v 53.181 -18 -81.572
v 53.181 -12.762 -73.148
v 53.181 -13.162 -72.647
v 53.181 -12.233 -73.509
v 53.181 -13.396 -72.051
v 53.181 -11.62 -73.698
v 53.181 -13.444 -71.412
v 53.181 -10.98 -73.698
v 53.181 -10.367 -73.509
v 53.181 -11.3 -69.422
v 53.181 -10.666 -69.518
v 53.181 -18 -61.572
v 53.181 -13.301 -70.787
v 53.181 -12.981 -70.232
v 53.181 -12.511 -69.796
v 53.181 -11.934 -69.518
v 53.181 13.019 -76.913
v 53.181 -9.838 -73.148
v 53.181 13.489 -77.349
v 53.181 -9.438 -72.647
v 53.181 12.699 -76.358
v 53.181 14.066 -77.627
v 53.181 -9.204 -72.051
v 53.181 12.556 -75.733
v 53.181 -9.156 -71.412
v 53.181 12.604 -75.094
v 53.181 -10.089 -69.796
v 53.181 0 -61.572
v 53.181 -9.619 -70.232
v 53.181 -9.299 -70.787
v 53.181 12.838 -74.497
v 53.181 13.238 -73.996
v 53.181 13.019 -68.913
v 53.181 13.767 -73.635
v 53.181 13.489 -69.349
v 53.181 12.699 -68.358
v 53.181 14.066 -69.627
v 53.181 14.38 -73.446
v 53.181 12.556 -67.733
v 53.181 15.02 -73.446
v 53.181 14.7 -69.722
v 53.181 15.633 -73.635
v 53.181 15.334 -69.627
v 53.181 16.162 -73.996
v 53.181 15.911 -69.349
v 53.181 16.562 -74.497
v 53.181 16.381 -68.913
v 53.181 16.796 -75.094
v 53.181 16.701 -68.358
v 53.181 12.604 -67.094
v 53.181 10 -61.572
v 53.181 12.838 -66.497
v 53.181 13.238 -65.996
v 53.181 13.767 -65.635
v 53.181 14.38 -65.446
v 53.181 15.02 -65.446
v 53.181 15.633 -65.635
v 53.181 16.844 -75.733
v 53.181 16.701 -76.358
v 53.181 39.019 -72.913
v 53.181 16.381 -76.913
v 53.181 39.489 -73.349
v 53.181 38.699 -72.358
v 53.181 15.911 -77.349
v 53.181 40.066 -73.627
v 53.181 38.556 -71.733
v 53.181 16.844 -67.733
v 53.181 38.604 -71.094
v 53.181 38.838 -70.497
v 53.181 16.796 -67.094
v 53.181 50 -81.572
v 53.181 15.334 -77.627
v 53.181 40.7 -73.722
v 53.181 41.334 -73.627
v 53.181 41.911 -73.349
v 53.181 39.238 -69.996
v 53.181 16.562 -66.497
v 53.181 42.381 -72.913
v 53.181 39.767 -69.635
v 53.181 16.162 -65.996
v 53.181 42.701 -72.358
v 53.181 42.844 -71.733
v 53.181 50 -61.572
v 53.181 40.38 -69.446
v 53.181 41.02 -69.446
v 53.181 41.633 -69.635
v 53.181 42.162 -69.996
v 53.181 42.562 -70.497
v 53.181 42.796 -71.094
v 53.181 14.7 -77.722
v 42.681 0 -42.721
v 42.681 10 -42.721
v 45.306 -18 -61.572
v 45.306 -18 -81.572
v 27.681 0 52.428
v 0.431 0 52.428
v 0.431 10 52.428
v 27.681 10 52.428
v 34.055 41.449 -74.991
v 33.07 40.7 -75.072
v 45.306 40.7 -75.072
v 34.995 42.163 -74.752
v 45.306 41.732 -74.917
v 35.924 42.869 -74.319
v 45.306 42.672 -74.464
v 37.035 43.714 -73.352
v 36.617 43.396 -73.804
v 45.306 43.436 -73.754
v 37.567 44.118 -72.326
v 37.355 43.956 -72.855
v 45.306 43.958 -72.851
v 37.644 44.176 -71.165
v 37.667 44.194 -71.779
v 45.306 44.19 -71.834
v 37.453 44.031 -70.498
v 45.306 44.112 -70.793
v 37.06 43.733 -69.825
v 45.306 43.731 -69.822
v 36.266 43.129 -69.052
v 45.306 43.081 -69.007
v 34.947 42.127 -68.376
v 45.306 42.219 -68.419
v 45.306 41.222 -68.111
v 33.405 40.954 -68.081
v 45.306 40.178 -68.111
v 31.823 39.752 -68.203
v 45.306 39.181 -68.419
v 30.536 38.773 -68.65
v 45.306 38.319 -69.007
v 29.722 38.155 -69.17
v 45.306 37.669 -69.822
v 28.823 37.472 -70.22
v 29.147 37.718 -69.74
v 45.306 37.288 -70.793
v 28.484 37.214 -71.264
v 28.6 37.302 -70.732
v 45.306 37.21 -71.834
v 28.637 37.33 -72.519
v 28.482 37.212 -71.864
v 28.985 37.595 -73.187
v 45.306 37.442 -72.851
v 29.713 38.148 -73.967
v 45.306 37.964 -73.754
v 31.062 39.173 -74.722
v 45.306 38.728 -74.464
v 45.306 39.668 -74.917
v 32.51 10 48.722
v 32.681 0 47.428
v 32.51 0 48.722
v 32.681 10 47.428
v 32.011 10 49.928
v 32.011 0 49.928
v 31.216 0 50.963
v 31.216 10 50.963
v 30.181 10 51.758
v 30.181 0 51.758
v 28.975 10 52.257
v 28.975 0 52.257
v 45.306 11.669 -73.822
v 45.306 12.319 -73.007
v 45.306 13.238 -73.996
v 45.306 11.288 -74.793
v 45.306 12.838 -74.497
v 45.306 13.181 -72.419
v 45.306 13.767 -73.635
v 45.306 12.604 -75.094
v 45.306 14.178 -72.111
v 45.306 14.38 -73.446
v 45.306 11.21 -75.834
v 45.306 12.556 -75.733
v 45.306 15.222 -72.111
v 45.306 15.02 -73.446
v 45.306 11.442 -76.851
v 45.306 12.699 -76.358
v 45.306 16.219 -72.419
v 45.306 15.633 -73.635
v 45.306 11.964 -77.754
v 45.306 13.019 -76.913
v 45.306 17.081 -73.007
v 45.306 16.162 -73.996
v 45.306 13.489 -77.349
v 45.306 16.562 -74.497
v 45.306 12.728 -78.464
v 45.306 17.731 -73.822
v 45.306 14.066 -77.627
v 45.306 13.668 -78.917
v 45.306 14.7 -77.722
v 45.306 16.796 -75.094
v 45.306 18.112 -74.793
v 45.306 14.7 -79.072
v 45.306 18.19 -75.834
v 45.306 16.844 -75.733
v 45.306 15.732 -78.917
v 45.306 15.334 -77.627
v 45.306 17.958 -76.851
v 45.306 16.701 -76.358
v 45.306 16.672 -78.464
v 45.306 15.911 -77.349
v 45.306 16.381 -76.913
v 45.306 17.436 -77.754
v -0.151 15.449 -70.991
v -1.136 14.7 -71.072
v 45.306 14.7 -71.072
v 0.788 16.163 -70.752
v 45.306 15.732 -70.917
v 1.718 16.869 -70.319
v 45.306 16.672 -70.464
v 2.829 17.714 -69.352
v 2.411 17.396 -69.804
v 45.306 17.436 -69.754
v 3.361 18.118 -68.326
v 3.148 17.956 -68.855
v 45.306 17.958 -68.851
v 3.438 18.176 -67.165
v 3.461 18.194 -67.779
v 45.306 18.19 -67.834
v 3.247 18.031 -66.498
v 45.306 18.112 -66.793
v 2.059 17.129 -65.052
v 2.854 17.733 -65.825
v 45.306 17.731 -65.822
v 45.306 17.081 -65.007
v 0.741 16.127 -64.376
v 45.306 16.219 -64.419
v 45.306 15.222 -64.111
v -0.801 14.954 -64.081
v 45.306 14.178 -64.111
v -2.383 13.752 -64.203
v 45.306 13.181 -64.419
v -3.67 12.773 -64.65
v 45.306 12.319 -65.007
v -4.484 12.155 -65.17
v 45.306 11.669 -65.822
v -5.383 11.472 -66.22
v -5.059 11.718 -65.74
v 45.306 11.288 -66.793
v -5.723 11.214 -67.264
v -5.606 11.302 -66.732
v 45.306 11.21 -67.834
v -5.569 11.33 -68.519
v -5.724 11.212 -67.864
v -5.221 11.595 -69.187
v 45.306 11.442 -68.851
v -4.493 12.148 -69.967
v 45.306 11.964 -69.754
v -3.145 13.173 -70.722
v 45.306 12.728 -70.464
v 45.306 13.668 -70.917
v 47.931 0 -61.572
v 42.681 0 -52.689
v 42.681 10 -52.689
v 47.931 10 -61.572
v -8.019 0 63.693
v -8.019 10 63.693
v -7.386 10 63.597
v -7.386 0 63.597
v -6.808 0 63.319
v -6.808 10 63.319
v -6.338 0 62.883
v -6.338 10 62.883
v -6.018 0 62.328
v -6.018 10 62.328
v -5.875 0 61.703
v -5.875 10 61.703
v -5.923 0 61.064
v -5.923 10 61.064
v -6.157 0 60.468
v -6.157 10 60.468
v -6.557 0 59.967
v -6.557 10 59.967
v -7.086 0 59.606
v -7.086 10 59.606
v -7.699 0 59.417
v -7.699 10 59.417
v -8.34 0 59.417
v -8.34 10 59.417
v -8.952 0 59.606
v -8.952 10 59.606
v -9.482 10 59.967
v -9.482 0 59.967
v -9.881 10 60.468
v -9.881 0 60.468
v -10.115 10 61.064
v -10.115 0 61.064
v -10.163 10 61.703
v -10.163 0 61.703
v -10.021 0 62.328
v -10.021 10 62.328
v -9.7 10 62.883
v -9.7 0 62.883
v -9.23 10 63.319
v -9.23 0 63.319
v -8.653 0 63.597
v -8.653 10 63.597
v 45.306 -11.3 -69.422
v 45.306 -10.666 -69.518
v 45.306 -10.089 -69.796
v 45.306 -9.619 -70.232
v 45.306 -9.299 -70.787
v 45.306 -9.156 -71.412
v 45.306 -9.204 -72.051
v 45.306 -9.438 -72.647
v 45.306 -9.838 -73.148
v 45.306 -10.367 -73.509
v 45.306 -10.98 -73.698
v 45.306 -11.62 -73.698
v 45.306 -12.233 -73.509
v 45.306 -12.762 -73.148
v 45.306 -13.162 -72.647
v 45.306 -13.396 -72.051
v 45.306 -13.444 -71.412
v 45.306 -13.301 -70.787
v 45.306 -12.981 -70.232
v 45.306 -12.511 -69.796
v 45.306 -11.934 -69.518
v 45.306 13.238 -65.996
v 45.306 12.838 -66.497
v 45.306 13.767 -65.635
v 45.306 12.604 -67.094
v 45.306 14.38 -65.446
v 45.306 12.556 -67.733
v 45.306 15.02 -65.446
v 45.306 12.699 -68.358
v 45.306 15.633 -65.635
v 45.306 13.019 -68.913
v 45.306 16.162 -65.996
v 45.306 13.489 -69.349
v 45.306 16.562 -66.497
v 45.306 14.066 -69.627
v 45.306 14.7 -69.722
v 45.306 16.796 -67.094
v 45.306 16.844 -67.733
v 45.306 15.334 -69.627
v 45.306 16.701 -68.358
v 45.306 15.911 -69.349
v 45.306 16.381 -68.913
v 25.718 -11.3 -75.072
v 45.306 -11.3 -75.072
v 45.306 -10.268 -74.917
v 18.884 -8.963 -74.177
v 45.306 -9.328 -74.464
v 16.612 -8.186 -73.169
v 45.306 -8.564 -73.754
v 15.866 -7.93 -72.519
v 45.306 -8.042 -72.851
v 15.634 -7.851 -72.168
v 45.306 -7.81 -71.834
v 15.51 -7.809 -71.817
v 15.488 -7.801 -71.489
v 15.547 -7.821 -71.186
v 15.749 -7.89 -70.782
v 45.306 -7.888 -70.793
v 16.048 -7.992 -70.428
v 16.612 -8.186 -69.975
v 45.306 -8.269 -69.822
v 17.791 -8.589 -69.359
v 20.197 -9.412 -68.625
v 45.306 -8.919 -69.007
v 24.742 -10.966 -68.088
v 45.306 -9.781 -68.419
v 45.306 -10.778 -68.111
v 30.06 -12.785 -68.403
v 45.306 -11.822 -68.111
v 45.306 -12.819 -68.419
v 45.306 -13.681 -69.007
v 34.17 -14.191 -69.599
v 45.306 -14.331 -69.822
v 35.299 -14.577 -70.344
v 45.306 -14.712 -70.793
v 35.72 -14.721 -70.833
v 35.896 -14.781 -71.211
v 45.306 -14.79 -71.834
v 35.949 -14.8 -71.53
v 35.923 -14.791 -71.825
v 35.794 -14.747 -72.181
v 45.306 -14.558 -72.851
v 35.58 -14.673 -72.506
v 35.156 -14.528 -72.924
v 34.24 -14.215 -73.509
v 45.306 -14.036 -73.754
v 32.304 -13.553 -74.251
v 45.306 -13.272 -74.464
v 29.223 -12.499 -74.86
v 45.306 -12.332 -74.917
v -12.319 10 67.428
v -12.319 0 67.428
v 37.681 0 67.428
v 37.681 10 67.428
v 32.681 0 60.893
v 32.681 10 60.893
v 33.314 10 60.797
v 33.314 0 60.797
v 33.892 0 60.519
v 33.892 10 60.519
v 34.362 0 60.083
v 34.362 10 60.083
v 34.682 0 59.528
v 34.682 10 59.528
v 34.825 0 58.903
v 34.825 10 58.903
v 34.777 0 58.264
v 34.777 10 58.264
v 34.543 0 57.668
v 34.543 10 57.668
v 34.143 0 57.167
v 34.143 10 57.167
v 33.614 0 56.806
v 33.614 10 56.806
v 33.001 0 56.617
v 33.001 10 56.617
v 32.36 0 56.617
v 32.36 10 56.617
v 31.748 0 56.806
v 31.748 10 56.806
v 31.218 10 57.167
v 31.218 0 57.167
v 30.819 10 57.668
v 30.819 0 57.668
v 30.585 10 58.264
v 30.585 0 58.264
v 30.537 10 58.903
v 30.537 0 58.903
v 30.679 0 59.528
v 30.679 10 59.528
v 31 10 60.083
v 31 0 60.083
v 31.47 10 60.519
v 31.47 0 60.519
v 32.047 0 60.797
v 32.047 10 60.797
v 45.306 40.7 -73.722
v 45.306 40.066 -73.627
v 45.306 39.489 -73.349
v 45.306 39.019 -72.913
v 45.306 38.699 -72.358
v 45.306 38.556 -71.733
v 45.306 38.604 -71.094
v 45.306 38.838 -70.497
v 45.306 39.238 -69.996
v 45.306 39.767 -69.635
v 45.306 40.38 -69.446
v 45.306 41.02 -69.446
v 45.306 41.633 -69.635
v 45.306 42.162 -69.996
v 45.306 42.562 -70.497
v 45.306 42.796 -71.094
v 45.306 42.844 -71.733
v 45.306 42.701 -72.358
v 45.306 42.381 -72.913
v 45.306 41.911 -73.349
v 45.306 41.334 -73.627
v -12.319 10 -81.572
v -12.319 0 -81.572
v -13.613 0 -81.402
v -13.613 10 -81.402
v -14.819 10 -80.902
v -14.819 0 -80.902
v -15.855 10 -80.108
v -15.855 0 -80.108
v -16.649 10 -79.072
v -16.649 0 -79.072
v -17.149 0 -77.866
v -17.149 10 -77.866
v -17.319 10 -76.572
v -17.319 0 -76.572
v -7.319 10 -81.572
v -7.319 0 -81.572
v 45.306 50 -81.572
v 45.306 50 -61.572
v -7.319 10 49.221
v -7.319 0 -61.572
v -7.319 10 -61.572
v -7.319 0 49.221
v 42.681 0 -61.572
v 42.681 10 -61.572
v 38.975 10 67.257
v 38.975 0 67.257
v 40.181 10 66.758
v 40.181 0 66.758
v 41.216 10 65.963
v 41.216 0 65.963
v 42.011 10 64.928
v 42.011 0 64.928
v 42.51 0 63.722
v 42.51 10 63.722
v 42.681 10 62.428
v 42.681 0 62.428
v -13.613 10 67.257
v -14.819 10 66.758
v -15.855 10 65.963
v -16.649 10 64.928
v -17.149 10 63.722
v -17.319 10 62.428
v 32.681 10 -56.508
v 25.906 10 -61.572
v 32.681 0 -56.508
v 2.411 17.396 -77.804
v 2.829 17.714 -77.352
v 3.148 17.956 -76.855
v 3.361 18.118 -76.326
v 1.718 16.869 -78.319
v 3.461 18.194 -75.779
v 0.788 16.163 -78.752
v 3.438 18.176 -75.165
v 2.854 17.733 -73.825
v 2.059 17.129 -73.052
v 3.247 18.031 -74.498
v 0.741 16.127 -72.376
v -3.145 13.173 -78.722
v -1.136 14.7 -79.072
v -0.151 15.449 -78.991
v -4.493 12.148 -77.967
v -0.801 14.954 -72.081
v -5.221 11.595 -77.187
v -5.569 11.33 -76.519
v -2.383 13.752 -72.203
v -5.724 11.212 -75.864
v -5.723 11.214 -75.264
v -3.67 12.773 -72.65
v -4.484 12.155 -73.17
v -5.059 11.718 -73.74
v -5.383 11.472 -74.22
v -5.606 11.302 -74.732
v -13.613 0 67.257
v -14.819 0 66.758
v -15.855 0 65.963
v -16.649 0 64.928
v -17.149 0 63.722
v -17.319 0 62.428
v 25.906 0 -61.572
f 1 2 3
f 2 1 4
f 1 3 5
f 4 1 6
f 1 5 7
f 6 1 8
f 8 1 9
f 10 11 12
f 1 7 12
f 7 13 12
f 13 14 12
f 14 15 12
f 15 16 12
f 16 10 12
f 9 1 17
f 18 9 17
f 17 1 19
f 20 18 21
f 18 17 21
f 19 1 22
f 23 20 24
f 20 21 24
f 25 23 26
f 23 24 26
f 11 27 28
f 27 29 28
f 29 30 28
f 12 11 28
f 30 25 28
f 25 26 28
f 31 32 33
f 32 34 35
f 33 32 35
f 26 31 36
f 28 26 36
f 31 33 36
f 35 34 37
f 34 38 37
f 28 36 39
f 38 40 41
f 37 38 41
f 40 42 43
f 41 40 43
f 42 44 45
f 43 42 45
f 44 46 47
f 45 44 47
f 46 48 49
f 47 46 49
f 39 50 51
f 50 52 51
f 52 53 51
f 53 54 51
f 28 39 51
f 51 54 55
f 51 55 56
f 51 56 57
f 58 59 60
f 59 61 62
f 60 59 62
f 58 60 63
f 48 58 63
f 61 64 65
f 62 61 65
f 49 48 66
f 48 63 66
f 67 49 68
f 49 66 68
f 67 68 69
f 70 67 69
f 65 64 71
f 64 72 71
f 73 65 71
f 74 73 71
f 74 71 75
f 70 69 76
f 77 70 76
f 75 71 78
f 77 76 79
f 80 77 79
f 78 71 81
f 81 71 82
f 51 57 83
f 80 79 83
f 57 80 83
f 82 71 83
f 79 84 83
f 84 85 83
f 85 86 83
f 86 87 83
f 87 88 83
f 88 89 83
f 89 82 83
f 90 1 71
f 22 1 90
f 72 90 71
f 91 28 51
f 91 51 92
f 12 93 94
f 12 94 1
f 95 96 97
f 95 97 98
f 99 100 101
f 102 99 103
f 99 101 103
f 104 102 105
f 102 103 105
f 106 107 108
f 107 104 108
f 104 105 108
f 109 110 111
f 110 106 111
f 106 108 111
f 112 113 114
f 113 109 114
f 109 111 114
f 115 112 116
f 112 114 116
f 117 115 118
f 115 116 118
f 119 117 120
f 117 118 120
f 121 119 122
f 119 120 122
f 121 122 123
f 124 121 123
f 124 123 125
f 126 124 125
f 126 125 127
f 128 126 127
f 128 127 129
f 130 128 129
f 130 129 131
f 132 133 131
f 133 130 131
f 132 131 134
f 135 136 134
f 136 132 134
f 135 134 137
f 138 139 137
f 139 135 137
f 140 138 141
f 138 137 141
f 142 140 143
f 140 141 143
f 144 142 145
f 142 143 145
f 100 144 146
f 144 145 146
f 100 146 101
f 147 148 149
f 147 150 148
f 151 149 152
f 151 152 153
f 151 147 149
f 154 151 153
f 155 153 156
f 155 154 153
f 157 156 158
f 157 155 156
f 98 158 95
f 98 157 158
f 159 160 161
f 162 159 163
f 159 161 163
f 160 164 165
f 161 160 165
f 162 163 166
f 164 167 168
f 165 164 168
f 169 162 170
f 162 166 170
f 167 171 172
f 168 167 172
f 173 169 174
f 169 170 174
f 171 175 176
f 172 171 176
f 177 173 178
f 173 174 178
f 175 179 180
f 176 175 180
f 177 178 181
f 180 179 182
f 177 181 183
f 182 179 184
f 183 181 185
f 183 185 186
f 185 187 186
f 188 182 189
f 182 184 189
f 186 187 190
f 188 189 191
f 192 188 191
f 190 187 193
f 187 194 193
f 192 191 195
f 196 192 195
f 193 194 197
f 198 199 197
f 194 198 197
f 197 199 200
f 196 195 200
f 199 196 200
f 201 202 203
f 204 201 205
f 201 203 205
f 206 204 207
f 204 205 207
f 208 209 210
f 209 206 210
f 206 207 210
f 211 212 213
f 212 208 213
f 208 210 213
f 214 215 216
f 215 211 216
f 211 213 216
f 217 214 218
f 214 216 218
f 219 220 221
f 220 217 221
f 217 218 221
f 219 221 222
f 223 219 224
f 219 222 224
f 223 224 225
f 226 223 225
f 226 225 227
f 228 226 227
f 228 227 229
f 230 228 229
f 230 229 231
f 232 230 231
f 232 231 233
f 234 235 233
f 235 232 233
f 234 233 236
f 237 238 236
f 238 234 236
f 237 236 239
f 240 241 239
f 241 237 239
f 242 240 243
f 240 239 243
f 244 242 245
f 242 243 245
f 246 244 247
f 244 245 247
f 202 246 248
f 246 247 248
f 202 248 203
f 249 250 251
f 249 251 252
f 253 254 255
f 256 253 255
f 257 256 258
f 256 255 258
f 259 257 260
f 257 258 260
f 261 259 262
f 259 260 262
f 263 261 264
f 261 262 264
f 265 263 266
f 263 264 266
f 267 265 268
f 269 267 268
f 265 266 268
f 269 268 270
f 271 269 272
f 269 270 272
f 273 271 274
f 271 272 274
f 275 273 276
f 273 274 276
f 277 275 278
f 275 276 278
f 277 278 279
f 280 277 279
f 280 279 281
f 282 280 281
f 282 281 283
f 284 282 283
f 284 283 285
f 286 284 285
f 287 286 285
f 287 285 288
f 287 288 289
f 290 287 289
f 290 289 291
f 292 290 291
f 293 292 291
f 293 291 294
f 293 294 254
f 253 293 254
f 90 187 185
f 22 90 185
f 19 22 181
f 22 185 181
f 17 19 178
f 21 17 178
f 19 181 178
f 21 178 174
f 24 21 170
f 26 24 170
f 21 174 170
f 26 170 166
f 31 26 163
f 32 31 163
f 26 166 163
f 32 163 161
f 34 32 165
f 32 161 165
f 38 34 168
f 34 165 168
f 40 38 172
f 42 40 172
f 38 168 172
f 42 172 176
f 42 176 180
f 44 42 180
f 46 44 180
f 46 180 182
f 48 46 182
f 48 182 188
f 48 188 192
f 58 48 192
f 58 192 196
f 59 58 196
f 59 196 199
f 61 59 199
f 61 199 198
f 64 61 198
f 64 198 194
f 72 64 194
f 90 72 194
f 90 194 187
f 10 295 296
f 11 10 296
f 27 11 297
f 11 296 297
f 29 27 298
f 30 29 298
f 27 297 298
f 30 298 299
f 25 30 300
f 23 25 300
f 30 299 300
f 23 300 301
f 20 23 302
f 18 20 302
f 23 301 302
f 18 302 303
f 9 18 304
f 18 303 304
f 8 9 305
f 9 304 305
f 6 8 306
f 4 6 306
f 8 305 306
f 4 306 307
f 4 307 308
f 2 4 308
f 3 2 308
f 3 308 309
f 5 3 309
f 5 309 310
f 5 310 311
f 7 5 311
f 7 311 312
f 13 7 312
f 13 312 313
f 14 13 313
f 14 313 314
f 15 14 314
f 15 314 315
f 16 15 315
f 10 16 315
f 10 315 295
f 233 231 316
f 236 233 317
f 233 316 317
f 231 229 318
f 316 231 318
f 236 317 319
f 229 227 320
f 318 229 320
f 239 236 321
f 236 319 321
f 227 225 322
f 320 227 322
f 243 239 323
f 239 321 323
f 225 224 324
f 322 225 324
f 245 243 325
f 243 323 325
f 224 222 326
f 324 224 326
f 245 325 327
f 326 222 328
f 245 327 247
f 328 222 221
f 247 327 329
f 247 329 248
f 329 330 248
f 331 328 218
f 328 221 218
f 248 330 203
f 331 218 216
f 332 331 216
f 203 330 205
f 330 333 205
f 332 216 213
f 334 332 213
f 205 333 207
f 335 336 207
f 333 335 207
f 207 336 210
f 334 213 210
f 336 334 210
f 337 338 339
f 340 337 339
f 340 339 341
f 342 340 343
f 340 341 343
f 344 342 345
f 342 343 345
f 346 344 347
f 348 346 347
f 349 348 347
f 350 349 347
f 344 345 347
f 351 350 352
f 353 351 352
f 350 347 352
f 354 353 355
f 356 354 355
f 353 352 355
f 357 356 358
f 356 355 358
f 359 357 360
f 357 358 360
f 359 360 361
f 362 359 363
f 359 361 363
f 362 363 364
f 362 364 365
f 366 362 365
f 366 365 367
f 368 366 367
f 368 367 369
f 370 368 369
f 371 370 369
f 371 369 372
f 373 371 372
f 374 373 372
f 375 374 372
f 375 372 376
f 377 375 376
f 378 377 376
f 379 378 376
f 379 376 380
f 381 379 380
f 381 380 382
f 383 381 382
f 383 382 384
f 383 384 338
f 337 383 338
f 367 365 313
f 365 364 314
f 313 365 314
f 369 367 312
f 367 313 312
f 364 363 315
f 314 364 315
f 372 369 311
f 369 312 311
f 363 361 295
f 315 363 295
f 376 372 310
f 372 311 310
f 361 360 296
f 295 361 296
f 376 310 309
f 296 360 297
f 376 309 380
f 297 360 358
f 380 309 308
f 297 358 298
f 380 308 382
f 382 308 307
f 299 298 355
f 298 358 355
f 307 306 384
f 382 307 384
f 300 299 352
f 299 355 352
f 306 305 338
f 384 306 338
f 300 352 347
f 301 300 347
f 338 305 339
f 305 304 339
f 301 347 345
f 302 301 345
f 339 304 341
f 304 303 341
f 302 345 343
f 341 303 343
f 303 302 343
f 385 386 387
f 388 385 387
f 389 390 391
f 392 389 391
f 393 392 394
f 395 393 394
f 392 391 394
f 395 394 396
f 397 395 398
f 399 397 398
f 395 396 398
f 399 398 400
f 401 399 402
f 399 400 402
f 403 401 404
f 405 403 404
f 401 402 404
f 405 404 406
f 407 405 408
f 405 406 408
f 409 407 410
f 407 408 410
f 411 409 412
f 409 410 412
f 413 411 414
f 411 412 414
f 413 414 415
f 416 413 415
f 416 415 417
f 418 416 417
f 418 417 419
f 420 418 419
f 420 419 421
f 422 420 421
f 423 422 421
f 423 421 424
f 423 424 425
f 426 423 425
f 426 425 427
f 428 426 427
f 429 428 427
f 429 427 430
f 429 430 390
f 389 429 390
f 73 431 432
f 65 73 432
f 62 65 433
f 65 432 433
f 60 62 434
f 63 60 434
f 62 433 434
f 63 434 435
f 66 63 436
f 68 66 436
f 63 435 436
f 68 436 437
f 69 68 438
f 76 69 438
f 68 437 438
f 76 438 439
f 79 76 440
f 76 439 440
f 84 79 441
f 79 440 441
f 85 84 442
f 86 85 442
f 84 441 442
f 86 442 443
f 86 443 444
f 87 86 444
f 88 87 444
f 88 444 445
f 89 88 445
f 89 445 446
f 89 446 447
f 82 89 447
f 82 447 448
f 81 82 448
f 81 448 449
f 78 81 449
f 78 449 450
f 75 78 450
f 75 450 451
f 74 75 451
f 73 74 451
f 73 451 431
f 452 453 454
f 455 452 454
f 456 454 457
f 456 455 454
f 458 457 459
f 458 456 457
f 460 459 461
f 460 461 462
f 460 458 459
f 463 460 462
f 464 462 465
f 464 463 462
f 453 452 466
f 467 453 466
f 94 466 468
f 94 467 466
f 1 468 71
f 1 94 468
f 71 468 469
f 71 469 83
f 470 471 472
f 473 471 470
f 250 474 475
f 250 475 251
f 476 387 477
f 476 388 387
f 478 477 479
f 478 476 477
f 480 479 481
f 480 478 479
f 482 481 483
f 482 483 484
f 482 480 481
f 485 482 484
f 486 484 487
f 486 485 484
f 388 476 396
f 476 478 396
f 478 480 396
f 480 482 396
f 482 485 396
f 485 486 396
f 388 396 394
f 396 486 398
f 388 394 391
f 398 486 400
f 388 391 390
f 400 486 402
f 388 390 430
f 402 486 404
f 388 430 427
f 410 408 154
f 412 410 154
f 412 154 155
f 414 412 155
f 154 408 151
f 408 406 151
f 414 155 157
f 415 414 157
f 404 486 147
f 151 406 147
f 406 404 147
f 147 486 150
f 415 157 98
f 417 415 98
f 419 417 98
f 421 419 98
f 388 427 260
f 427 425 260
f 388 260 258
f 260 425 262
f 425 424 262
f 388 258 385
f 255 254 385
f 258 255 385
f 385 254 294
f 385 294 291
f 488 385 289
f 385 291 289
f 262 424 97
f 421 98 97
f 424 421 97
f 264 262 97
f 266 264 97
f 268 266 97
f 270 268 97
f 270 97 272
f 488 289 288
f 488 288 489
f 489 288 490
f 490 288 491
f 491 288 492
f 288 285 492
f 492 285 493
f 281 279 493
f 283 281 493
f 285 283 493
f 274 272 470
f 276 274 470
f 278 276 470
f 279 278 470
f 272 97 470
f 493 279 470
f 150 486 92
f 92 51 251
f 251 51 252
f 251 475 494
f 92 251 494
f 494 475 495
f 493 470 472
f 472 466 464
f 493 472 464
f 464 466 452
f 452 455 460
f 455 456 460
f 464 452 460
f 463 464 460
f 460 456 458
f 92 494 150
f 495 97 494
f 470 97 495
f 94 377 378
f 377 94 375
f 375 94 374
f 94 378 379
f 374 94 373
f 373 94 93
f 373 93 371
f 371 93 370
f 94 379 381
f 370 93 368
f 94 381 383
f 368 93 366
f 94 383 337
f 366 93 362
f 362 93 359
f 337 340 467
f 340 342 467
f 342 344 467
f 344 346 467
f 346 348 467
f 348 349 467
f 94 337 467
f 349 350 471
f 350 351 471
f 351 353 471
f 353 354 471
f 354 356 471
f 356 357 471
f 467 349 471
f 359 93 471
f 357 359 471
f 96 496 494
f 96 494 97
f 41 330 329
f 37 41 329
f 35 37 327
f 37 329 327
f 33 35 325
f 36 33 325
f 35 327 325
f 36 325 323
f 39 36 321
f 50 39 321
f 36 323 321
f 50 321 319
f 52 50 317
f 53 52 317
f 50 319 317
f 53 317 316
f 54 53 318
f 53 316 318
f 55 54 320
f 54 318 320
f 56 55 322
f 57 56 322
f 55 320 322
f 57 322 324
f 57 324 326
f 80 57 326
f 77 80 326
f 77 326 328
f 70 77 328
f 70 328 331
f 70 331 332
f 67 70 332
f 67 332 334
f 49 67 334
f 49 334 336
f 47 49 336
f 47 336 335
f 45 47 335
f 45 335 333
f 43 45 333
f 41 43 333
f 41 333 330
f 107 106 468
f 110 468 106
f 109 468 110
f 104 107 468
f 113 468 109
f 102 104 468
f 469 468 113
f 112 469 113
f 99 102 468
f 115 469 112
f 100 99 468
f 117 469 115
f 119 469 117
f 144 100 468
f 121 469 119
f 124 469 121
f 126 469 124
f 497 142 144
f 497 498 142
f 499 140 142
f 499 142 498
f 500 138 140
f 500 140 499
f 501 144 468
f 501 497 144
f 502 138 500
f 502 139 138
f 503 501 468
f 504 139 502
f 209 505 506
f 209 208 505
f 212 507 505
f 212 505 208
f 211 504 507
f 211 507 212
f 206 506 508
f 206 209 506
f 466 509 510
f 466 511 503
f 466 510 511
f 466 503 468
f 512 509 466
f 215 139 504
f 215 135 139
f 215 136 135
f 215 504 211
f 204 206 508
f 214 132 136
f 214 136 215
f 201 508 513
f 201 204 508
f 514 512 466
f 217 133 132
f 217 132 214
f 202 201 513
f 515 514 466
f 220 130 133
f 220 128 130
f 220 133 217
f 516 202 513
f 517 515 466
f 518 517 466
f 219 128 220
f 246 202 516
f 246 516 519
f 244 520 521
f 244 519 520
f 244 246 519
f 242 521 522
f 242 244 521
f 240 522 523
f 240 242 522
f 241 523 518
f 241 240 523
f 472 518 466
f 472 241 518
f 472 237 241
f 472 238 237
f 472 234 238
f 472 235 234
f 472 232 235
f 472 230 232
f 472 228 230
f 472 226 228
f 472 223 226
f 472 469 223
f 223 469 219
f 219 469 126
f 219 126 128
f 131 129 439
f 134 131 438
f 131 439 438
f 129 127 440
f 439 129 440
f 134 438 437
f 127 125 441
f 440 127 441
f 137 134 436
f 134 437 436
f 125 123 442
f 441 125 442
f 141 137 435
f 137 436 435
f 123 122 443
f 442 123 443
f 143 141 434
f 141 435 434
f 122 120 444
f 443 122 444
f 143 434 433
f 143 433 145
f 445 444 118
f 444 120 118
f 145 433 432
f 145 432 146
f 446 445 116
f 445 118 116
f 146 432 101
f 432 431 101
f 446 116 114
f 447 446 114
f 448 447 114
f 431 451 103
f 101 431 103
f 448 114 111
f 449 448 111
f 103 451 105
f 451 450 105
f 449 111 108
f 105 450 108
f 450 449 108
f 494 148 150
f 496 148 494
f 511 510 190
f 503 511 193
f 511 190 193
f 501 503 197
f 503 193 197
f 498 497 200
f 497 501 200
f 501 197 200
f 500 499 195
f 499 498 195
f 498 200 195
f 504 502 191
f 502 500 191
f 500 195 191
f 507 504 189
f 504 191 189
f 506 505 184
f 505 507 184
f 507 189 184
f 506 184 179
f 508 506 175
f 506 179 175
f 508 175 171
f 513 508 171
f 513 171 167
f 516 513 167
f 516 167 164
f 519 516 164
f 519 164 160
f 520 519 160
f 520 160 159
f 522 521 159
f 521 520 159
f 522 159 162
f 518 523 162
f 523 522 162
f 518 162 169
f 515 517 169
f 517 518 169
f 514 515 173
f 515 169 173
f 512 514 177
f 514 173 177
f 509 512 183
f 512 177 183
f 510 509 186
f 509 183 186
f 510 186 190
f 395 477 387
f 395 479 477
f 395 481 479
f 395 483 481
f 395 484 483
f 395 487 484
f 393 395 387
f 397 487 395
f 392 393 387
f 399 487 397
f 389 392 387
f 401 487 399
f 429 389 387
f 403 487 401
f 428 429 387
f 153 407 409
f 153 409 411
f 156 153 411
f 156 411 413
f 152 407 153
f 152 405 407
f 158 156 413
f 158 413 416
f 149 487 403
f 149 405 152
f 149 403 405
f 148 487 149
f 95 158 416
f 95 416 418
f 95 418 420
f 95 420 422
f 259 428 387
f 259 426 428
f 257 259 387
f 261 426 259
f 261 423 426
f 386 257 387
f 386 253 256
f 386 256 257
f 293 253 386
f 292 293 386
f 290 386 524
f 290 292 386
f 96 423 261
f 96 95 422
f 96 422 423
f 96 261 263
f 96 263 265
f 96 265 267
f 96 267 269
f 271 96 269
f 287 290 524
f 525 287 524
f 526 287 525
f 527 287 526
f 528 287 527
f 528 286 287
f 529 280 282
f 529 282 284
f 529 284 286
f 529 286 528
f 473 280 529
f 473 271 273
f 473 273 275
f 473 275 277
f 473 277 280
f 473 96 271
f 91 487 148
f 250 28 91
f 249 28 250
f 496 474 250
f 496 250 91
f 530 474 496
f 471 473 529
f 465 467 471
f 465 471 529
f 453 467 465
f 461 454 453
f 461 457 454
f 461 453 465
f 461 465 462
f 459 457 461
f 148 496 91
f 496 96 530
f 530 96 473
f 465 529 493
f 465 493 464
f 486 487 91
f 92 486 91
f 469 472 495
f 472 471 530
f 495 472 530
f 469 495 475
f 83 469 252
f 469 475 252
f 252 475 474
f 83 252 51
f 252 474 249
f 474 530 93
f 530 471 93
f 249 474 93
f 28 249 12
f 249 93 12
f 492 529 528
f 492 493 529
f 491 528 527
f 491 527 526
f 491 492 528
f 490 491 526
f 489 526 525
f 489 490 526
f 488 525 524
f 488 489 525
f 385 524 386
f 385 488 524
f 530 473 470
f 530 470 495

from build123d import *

# Parameters (mm, degrees)
EXTRUDE_1_DEPTH                 = 10
SKETCH_4_W                      = 7.875
SKETCH_4_H                      = 20
EXTRUDE_2_DEPTH                 = 40
CUT_EXTRUDE_1_REACH             = 116.35
SKETCH_5_R                      = 2.15
CUT_EXTRUDE_1_DIRECTION_2_DEPTH = 53
CUT_EXTRUDE_2_REACH             = 107.272
SKETCH_6_R                      = 2.15
FILLET_1_R                      = 5
FILLET_2_R                      = 5
SKETCH_7_W                      = 7.875
SKETCH_7_H                      = 20
EXTRUDE_3_DEPTH                 = 18
CUT_EXTRUDE_3_REACH             = 116.35
SKETCH_8_R                      = 2.15
EXTRUDE_8_DEPTH                 = 20
SKETCH_15_W                     = 52.625
SKETCH_15_H                     = 20
EXTRUDE_9_DEPTH                 = 40
CUT_EXTRUDE_START               = -7.875
SKETCH_14_R                     = 3.5
CUT_EXTRUDE_8_DEPTH             = 54
CUT_EXTRUDE_10_DEPTH            = 20


with BuildPart() as part:
    # 草图1 → 凸台-拉伸1 (new body)
    with BuildSketch(Plane(origin=(0, 0, 0), x_dir=(1, 0, 0), z_dir=(0, 1, 0))):
        Polygon((5.931150433, 81.572237736), (53.180774799, 81.572237736), (53.180774799, 61.572237736), (42.680774799, 42.721022935), (42.680774799, 31.757290204), (42.680774799, -57.600660719), (42.680774799, -67.427762264), (0.431150433, -67.427762264), (-17.319225201, -67.427762264), (-17.319225201, 81.572237736), align=None)
        Polygon((47.930774799, 61.572237736), (42.680774799, 61.572237736), (42.680774799, 52.689495612), align=None, mode=Mode.SUBTRACT)
        Polygon((25.906315323, 61.572237736), (-7.319225201, 61.572237736), (-7.319225201, -49.220735683), align=None, mode=Mode.SUBTRACT)
        Polygon((0.431150433, -52.427762264), (32.680774799, -52.427762264), (32.680774799, 56.508121895), align=None, mode=Mode.SUBTRACT)
    extrude(amount=EXTRUDE_1_DEPTH)

    # 草图4 → 凸台-拉伸2 (add)
    with BuildSketch(Plane(origin=(0, 10, 0), x_dir=(1, 0, 0), z_dir=(0, 1, 0))):
        with Locations((49.243274799, 71.572237736)):
            Rectangle(SKETCH_4_W, SKETCH_4_H)
    extrude(amount=EXTRUDE_2_DEPTH)

    # 草图5 → 切除-拉伸1 (cut, up to next)
    with BuildSketch(Plane.ZY.offset(-45.305774799), mode=Mode.PRIVATE) as cut_extrude_1_sk1:
        with Locations(Location((-75.572237736, 14.7, 0), (0, 0, 180))):
            Circle(SKETCH_5_R)
    cut_extrude_1_tool1 = extrude(cut_extrude_1_sk1.sketch, amount=-CUT_EXTRUDE_1_REACH, mode=Mode.PRIVATE) & part.part
    # 草图5 → 切除-拉伸1 (cut, up to next)
    with BuildSketch(Plane.ZY.offset(-45.305774799), mode=Mode.PRIVATE) as cut_extrude_1_sk2:
        with Locations(Location((-67.572237736, 14.7, 0), (0, 0, 180))):
            Circle(SKETCH_5_R)
    cut_extrude_1_tool2 = extrude(cut_extrude_1_sk2.sketch, amount=-CUT_EXTRUDE_1_REACH, mode=Mode.PRIVATE) & part.part
    # 草图5 → 切除-拉伸1 (cut, up to next)
    with BuildSketch(Plane.ZY.offset(-45.305774799), mode=Mode.PRIVATE) as cut_extrude_1_sk3:
        with Locations(Location((-71.572237736, 40.7, 0), (0, 0, 180))):
            Circle(SKETCH_5_R)
    cut_extrude_1_tool3 = extrude(cut_extrude_1_sk3.sketch, amount=-CUT_EXTRUDE_1_REACH, mode=Mode.PRIVATE) & part.part
    add(cut_extrude_1_tool1.solids().sort_by_distance((45.305775, 14.7, -75.572238))[0], mode=Mode.SUBTRACT)
    add(cut_extrude_1_tool2.solids().sort_by_distance((45.305775, 14.7, -67.572238))[0], mode=Mode.SUBTRACT)
    add(cut_extrude_1_tool3.solids().sort_by_distance((45.305775, 40.7, -71.572238))[0], mode=Mode.SUBTRACT)

    # 草图5 → 切除-拉伸1 direction 2 (cut)
    with BuildSketch(Plane.ZY.offset(-45.305774799)):
        with Locations(Location((-75.572237736, 14.7, 0), (0, 0, 180))):
            Circle(SKETCH_5_R)
        with Locations(Location((-67.572237736, 14.7, 0), (0, 0, 180))):
            Circle(SKETCH_5_R)
        with Locations(Location((-71.572237736, 40.7, 0), (0, 0, 180))):
            Circle(SKETCH_5_R)
    extrude(amount=CUT_EXTRUDE_1_DIRECTION_2_DEPTH, mode=Mode.SUBTRACT)

    # 草图6 → 切除-拉伸2 (cut, up to next)
    with BuildSketch(Plane(origin=(0, 10, 0), x_dir=(1, 0, 0), z_dir=(0, 1, 0)), mode=Mode.PRIVATE) as cut_extrude_2_sk1:
        with Locations(Location((-8.019225201, -61.542634482, 0), (0, 0, 270))):
            Circle(SKETCH_6_R)
    cut_extrude_2_tool1 = extrude(cut_extrude_2_sk1.sketch, amount=-CUT_EXTRUDE_2_REACH, mode=Mode.PRIVATE) & part.part
    # 草图6 → 切除-拉伸2 (cut, up to next)
    with BuildSketch(Plane(origin=(0, 10, 0), x_dir=(1, 0, 0), z_dir=(0, 1, 0)), mode=Mode.PRIVATE) as cut_extrude_2_sk2:
        with Locations(Location((32.680774799, -58.742634482, 0), (0, 0, 270))):
            Circle(SKETCH_6_R)
    cut_extrude_2_tool2 = extrude(cut_extrude_2_sk2.sketch, amount=-CUT_EXTRUDE_2_REACH, mode=Mode.PRIVATE) & part.part
    add(cut_extrude_2_tool1.solids().sort_by_distance((-8.019225, 10, 61.542634))[0], mode=Mode.SUBTRACT)
    add(cut_extrude_2_tool2.solids().sort_by_distance((32.680775, 10, 58.742634))[0], mode=Mode.SUBTRACT)

    # 圆角1
    fillet_1_edges = [part.edges().sort_by_distance(p)[0] for p in [
        (-17.319225201, 5, 67.427762264),
        (-17.319225201, 5, -81.572237736),
        (42.680774799, 5, 67.427762264),
    ]]
    fillet(fillet_1_edges, radius=FILLET_1_R)

    # 圆角2
    fillet_2_edges = [part.edges().sort_by_distance(p)[0] for p in [
        (32.680774799, 5, 52.427762264),
    ]]
    fillet(fillet_2_edges, radius=FILLET_2_R)

    # 草图7 → 凸台-拉伸3 (add)
    with BuildSketch(Plane.XZ):
        with Locations((49.243274799, -71.572237736)):
            Rectangle(SKETCH_7_W, SKETCH_7_H)
    extrude(amount=EXTRUDE_3_DEPTH)

    # 草图8 → 切除-拉伸3 (cut, up to next)
    with BuildSketch(Plane.ZY.offset(-45.305774799), mode=Mode.PRIVATE) as cut_extrude_3_sk1:
        with Locations((-71.572237736, -11.3)):
            Circle(SKETCH_8_R)
    cut_extrude_3_tool1 = extrude(cut_extrude_3_sk1.sketch, amount=-CUT_EXTRUDE_3_REACH, mode=Mode.PRIVATE) & part.part
    add(cut_extrude_3_tool1.solids().sort_by_distance((45.305775, -11.3, -71.572238))[0], mode=Mode.SUBTRACT)

    # 草图13 → 凸台-拉伸8 (add)
    with BuildSketch(Plane.XY.offset(-61.572237736)):
        Polygon((45.305774799, 0), (45.305774799, -18), (-7.319225201, 0), align=None)
    extrude(amount=-EXTRUDE_8_DEPTH)

    # 草图15 → 凸台-拉伸9 (add)
    with BuildSketch(Plane(origin=(0, 10, 0), x_dir=(1, 0, 0), z_dir=(0, 1, 0))):
        with Locations((18.993274799, 71.572237736)):
            Rectangle(SKETCH_15_W, SKETCH_15_H)
    extrude(amount=EXTRUDE_9_DEPTH)

    # 草图14 → 切除-拉伸8 (cut)
    with BuildSketch(Plane(origin=(53.180774799, 0, 0), x_dir=(0, 0, -1), z_dir=(1, 0, 0)).offset(CUT_EXTRUDE_START)):
        with Locations((71.572237736, 40.7)):
            Circle(SKETCH_14_R)
        with Locations((67.572237736, 14.7)):
            Circle(SKETCH_14_R)
        with Locations((75.572237736, 14.7)):
            Circle(SKETCH_14_R)
        with Locations((71.572237736, -11.3)):
            Circle(SKETCH_14_R)
    extrude(amount=-CUT_EXTRUDE_8_DEPTH, mode=Mode.SUBTRACT)

    # 草图17 → 切除-拉伸10 (cut)
    with BuildSketch(Plane.XY.offset(-61.572237736)):
        Polygon((-7.319225201, 10), (-7.319225201, 50), (45.305774799, 50), align=None)
    extrude(amount=-CUT_EXTRUDE_10_DEPTH, mode=Mode.SUBTRACT)


solid = part.part
